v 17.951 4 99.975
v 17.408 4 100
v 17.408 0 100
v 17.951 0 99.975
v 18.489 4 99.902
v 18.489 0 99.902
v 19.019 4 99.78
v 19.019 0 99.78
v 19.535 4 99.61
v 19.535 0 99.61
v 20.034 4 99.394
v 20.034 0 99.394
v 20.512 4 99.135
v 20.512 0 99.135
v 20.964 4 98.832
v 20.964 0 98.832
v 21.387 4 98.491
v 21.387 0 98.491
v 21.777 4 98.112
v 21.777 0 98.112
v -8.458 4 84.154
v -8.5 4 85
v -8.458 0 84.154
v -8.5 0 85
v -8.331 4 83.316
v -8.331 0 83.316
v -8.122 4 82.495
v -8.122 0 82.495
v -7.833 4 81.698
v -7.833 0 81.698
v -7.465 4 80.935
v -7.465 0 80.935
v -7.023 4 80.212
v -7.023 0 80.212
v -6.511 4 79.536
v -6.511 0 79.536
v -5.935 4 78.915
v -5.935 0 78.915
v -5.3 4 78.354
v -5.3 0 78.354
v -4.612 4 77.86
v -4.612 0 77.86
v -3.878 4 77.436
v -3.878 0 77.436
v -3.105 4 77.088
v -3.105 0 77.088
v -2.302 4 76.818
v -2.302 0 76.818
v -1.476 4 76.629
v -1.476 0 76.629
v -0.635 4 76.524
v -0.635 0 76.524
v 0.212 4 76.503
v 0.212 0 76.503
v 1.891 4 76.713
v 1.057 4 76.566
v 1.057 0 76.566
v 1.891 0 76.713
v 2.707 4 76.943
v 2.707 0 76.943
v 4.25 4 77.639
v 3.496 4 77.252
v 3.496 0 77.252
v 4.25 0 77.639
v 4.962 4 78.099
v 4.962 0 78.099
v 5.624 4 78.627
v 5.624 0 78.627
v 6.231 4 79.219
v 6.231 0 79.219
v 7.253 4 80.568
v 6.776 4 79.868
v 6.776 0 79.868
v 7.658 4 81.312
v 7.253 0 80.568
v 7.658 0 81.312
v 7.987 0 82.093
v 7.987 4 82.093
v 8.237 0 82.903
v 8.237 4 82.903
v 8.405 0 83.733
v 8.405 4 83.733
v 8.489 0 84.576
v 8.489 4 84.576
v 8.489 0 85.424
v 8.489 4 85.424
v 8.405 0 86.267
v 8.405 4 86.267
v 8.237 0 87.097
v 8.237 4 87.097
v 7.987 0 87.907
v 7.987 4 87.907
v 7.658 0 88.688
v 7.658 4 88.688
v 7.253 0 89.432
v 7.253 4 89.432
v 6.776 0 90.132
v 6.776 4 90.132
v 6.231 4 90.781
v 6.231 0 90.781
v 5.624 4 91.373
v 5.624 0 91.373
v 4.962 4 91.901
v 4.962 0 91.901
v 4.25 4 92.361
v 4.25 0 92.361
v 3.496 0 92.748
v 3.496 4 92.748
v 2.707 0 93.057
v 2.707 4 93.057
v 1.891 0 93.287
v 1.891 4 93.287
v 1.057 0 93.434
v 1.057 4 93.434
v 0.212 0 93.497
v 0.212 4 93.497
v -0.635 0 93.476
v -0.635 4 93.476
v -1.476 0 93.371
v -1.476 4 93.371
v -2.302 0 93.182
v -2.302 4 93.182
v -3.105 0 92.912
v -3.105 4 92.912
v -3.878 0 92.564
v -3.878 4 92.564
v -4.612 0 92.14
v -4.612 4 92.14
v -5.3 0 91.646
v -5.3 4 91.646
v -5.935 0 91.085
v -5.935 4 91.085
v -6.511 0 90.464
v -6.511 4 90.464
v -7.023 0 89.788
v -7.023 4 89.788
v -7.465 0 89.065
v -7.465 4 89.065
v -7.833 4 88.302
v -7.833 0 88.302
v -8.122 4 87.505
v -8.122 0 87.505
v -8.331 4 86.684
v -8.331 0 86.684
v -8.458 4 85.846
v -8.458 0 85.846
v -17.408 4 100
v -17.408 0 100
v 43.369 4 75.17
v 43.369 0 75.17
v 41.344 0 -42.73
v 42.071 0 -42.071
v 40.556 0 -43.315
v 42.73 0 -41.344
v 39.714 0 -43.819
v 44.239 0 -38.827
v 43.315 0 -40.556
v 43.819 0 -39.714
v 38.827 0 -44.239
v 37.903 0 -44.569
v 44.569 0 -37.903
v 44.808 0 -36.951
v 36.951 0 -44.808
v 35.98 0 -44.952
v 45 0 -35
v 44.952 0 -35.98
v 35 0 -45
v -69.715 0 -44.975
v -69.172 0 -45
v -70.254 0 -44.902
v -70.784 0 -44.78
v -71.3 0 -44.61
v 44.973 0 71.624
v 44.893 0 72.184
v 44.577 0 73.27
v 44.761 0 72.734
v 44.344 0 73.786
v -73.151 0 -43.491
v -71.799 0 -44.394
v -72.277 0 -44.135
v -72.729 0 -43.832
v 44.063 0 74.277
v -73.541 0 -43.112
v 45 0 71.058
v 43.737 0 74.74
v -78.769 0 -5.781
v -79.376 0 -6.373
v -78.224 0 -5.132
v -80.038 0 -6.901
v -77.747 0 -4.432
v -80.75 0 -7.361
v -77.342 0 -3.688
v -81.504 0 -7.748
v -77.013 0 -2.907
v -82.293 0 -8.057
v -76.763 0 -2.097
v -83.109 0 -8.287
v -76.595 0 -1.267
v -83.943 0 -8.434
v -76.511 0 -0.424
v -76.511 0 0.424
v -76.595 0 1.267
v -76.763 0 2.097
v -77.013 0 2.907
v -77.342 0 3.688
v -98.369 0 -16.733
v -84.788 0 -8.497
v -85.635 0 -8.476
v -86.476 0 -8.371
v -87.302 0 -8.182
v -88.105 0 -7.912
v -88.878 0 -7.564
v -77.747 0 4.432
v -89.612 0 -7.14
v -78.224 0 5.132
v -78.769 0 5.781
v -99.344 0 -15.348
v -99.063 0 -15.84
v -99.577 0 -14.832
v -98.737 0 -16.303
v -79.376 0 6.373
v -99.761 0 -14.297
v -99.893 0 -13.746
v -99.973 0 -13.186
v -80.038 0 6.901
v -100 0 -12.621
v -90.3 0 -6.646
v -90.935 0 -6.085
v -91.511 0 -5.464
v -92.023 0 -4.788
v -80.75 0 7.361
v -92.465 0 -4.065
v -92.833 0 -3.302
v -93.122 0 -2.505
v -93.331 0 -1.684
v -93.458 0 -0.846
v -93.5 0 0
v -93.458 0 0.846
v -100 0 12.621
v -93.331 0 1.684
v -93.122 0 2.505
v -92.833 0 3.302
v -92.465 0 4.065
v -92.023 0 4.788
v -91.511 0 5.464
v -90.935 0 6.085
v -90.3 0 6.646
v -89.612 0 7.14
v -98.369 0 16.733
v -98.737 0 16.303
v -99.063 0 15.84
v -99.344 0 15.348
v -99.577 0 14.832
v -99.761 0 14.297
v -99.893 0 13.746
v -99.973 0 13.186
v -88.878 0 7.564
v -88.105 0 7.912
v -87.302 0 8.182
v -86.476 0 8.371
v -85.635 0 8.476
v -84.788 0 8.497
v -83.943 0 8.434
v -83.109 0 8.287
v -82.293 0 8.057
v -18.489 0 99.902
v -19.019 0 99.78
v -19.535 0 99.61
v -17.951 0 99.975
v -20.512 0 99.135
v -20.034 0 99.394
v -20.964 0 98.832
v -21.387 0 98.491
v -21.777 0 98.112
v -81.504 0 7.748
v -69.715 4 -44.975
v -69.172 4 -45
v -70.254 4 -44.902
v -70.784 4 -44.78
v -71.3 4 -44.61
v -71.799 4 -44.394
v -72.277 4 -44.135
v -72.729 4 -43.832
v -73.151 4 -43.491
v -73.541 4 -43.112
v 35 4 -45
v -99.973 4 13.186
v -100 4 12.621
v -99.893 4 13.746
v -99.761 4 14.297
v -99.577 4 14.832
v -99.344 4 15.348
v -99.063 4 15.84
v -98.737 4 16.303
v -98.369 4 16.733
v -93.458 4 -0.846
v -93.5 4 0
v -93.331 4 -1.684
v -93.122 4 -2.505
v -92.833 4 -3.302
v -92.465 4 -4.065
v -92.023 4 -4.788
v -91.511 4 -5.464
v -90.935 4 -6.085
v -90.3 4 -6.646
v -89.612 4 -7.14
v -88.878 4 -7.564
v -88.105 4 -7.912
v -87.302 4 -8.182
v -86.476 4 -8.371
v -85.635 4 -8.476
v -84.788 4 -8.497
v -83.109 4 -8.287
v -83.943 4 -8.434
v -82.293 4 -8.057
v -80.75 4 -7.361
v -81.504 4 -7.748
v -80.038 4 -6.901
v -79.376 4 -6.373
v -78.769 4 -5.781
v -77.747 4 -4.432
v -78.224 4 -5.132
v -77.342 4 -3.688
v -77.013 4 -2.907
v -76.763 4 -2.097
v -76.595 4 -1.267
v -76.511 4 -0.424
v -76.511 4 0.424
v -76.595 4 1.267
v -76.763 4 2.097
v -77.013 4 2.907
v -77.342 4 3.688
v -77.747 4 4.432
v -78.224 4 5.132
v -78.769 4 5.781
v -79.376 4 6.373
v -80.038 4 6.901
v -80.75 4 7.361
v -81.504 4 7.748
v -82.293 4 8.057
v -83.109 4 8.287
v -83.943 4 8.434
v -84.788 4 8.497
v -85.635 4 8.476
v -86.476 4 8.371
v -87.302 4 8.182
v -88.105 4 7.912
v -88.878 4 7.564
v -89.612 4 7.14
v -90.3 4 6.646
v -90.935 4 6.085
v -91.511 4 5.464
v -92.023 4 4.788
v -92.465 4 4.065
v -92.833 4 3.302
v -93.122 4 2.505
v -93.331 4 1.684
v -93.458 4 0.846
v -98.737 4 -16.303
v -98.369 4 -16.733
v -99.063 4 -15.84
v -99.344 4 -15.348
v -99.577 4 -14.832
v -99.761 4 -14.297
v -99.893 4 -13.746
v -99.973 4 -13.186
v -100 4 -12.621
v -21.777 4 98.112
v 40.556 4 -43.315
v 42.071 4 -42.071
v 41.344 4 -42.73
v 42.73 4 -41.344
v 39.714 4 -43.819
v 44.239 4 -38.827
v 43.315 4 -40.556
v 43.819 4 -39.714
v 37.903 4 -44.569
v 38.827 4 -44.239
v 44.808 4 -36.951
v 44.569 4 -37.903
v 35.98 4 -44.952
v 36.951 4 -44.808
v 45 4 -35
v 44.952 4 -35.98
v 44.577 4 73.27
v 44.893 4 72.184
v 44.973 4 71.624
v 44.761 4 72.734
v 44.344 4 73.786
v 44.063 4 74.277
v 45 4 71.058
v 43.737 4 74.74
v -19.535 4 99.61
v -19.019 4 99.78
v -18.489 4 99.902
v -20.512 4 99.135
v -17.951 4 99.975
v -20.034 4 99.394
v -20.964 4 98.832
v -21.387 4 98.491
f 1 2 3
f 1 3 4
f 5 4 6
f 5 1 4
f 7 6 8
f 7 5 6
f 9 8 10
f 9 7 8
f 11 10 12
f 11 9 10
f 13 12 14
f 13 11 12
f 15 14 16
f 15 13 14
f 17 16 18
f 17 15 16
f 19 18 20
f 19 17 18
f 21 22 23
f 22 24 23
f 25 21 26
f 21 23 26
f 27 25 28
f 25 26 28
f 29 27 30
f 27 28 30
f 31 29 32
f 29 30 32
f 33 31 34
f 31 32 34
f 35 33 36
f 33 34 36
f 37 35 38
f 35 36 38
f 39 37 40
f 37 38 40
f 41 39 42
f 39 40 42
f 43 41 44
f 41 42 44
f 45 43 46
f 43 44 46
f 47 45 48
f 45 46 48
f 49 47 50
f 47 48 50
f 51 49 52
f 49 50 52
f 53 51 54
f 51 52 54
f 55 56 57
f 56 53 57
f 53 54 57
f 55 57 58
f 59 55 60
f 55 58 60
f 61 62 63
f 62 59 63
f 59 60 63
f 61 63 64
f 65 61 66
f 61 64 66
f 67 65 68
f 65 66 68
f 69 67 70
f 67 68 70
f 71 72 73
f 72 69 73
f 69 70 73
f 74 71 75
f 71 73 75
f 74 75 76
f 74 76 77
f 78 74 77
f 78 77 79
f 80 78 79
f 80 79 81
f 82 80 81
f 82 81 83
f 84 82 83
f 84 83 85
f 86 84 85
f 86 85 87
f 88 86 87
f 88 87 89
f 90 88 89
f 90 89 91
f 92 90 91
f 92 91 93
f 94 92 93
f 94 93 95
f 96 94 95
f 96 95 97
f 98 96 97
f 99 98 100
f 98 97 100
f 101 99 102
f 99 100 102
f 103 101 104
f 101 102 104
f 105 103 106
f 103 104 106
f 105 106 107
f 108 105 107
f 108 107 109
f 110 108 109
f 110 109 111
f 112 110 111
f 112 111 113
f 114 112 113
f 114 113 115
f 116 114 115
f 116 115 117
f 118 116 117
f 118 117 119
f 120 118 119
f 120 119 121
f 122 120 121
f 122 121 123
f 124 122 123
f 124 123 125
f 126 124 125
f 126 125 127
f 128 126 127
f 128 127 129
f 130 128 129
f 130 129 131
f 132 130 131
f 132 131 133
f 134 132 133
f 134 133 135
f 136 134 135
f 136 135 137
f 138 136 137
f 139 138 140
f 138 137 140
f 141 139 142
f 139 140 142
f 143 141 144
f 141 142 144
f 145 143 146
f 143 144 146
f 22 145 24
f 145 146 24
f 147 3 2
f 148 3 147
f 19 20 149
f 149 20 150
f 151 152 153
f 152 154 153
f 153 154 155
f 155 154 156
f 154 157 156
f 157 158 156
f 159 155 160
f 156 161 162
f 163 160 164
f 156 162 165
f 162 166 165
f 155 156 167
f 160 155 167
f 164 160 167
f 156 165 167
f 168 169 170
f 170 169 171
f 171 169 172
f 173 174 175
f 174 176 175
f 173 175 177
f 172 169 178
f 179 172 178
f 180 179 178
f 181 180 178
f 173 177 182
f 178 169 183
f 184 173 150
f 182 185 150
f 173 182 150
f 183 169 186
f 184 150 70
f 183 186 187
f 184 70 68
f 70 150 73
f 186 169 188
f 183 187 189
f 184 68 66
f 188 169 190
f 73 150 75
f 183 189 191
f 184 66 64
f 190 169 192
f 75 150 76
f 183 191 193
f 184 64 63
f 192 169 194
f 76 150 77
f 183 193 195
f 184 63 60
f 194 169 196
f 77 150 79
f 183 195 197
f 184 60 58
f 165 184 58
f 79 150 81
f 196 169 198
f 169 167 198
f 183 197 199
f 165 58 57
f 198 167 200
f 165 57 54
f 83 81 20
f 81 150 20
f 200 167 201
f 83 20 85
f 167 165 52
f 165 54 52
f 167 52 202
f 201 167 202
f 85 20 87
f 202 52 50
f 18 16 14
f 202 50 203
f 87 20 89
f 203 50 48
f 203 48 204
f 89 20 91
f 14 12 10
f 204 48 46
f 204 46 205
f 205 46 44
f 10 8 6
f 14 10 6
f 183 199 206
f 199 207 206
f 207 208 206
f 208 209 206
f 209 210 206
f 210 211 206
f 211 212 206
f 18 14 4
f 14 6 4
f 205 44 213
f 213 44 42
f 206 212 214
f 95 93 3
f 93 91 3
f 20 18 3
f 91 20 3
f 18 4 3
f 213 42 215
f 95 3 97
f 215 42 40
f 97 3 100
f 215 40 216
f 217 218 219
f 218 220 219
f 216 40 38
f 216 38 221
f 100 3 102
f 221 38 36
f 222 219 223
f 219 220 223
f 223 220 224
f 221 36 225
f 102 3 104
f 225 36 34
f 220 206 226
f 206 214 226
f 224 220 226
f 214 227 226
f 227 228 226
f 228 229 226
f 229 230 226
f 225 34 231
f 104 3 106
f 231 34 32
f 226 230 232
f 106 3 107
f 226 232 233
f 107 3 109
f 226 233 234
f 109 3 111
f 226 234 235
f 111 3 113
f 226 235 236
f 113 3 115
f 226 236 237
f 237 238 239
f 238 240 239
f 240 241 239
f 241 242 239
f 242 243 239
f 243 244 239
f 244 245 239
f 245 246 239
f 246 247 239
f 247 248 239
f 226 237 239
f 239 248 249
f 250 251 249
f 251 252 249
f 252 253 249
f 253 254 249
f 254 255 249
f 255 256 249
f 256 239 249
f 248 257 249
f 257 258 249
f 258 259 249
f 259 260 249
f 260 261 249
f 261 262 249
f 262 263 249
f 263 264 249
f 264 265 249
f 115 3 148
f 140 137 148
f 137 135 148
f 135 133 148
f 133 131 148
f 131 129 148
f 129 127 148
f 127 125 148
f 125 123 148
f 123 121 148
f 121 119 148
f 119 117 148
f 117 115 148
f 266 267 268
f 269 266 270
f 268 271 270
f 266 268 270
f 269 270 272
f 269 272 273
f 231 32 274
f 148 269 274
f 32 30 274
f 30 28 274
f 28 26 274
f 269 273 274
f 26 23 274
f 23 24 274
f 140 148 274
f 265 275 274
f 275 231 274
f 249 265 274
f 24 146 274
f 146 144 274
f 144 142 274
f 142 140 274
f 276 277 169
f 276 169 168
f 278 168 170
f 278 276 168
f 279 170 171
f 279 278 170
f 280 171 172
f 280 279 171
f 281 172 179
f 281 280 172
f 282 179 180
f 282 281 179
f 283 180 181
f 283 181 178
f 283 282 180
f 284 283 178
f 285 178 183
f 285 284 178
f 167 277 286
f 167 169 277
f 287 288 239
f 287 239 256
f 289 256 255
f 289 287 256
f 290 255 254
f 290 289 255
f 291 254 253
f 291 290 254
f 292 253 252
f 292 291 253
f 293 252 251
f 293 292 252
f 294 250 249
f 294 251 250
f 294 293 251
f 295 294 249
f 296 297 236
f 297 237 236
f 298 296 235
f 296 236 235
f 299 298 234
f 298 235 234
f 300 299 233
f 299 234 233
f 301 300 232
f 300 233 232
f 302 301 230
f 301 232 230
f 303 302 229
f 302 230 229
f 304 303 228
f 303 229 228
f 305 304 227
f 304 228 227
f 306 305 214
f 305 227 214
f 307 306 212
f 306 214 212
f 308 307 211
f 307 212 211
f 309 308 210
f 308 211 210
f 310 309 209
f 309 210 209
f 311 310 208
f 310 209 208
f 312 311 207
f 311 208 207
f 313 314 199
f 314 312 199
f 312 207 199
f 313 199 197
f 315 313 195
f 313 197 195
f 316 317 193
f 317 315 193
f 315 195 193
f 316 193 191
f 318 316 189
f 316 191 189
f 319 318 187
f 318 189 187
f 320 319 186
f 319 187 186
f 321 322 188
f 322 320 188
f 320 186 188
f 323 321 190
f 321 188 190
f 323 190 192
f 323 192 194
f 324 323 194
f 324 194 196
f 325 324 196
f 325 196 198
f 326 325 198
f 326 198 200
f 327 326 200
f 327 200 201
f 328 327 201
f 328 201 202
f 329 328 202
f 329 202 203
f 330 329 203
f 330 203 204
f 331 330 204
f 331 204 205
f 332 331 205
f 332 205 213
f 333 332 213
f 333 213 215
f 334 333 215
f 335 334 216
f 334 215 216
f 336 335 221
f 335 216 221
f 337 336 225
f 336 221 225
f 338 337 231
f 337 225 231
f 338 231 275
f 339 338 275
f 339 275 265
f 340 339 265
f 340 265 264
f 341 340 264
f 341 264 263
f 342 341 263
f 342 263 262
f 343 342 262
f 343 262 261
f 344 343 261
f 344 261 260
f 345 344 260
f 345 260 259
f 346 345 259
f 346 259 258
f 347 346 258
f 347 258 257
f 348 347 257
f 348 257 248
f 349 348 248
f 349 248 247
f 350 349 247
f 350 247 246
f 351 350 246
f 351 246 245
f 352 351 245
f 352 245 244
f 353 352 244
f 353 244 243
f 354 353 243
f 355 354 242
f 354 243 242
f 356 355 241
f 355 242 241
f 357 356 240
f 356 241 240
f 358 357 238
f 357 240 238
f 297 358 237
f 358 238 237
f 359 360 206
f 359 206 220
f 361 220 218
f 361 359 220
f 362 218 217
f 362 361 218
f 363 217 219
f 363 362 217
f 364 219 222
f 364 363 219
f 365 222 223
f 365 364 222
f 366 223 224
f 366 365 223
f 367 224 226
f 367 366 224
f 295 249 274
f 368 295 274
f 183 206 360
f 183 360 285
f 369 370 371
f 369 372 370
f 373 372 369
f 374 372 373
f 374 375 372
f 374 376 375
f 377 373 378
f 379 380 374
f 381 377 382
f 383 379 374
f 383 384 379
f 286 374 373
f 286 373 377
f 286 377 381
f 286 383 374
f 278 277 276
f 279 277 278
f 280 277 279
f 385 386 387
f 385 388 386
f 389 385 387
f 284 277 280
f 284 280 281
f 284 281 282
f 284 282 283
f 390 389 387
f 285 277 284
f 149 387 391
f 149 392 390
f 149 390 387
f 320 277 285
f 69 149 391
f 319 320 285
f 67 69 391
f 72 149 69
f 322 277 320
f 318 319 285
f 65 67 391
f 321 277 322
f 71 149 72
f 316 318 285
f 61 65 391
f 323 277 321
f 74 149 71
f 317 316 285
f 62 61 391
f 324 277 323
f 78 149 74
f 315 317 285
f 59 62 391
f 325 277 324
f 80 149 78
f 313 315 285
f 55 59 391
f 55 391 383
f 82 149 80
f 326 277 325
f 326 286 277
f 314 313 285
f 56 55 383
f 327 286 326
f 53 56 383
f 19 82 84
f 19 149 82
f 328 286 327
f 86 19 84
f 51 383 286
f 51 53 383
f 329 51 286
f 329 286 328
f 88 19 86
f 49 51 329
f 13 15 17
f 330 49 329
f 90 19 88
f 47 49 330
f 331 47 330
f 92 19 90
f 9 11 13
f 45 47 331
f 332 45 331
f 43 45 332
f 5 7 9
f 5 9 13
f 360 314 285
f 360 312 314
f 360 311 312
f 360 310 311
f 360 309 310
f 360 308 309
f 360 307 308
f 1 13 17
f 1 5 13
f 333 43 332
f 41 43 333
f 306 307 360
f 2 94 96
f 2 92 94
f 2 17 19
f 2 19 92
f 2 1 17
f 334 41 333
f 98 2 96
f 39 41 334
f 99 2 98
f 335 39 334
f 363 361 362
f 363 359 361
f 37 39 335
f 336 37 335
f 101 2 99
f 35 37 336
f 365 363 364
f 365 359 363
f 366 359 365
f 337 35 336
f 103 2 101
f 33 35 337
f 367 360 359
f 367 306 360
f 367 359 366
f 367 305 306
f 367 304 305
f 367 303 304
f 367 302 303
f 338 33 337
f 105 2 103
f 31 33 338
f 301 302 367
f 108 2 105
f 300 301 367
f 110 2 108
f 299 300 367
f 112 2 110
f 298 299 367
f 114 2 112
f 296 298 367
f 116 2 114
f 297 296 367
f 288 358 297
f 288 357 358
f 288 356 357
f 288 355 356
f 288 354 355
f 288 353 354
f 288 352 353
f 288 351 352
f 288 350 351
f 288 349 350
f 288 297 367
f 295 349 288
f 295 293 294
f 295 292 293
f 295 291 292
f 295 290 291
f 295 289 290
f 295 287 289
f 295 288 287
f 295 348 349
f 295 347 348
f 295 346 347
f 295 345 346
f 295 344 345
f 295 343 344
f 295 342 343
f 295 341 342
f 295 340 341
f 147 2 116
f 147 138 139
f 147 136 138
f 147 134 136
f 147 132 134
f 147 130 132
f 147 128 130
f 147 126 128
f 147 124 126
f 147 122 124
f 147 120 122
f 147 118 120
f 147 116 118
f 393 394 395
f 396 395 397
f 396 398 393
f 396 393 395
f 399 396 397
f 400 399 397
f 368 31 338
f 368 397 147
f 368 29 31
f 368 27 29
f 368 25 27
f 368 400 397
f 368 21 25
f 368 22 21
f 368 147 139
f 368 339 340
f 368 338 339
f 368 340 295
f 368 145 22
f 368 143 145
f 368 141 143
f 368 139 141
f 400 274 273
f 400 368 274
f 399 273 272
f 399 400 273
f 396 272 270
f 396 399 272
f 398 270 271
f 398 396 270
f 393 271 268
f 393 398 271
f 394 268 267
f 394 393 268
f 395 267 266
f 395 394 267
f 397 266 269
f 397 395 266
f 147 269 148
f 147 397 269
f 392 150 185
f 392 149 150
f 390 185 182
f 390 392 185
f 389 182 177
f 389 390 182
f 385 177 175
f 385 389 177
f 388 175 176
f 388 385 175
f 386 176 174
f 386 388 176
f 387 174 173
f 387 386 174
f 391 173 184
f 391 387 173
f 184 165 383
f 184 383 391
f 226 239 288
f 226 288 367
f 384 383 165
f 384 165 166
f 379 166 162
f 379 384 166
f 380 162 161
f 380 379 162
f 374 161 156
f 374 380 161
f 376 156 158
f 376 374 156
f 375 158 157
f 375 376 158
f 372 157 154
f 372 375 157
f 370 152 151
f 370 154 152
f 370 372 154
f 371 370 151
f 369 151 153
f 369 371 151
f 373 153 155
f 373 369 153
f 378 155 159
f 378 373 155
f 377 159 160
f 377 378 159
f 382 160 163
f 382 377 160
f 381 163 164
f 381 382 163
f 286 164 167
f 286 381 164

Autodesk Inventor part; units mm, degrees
ref_plane "YZ Plane" through (0, 0, 0) normal (1, 0, 0) x (0, 1, 0)
ref_plane "XZ Plane" through (0, 0, 0) normal (0, 1, 0) x (-1, 0, 0)
ref_plane "XY Plane" through (0, 0, 0) normal (0, 0, 1) x (1, 0, 0)
sketch "Sketch1" plane through (0, 0, 0) normal (0, 1, 0) x (-1, 0, 0)
  line L0 (40, 40) -> (-40, 40) construction
  line L1 (-40, 40) -> (-40, -40) construction
  line L2 (-40, -40) -> (40, -40) construction
  line L3 (40, -40) -> (40, 40) construction
  line L4 (-40, 40) -> (40, -40) construction
  line L5 (100, -45) -> (-100, -45)
  line L6 (-100, -45) -> (-100, 100)
  line L7 (-100, 100) -> (100, 100)
  line L8 (100, 100) -> (100, -45)
  circle A0 centre (85, 0) radius 8.5
  circle A1 centre (0, 85) radius 8.5
  circle A2 centre (-85, 0) radius 8.5
  line L9 (0, 40) -> (0, -40) construction
  line L10 (100, 15) -> (20, 100)
  line L11 (-20, 100) -> (-100, 15)
  line L12 (100, -15) -> (71.7647, -45)
  line L13 (-100, -15) -> (-71.7647, -45)
  line L14 (0, 0) -> (-40, 0) construction
  line L15 (-45, -45) -> (-45, 73.4375)
  point P0 (0, 0)
  point P1 (0, 0)
  dimension "d2" = 80
  dimension "d3" = 80
  dimension "d17" = 5
  dimension "d18" = 17
  dimension "d19" = 45
  dimension "d20" = 45
  dimension "d21" = 40
  dimension "d22" = 15
  dimension "d23" = 15
  dimension "d24" = 30
  dimension "d26" = 5
extrude "Plate1" add sketch "Sketch1" along normal blind 4 contours L5 L15 L11 L7 L10 L8 L12
fillet "Corner Round2" radius 6 6 edges at (-20, 2, 100) (20, 2, 100) (-100, 2, 15) (-100, 2, -15) (-71.7647, 2, -45) (45, 2, 73.4375)
fillet "Corner Round4" radius 10 1 edges at (45, 2, -45)
equation "\"d20\" = d19"
equation "\"d23\" = d22"
equation "\"d26\" = d17"
equation "\"d6\" = Thickness"
equation "\"BendReliefWidth\" = Thickness"
equation "\"BendReliefDepth\" = 0.5 * Thickness"
equation "\"CornerReliefSize\" = 4 * Thickness"
equation "\"MinimumRemnant\" = 2 * Thickness"
equation "\"TransitionRadius\" = BendRadius"
equation "\"JacobiRadiusSize\" = BendRadius"
equation "\"GapSize\" = Thickness"
equation "\"Thickness\" = 4"
equation "\"BendRadius\" = 6"
properties part number "MSC 902 FLANGE FRAME HEEL" material "Stainless Steel"
